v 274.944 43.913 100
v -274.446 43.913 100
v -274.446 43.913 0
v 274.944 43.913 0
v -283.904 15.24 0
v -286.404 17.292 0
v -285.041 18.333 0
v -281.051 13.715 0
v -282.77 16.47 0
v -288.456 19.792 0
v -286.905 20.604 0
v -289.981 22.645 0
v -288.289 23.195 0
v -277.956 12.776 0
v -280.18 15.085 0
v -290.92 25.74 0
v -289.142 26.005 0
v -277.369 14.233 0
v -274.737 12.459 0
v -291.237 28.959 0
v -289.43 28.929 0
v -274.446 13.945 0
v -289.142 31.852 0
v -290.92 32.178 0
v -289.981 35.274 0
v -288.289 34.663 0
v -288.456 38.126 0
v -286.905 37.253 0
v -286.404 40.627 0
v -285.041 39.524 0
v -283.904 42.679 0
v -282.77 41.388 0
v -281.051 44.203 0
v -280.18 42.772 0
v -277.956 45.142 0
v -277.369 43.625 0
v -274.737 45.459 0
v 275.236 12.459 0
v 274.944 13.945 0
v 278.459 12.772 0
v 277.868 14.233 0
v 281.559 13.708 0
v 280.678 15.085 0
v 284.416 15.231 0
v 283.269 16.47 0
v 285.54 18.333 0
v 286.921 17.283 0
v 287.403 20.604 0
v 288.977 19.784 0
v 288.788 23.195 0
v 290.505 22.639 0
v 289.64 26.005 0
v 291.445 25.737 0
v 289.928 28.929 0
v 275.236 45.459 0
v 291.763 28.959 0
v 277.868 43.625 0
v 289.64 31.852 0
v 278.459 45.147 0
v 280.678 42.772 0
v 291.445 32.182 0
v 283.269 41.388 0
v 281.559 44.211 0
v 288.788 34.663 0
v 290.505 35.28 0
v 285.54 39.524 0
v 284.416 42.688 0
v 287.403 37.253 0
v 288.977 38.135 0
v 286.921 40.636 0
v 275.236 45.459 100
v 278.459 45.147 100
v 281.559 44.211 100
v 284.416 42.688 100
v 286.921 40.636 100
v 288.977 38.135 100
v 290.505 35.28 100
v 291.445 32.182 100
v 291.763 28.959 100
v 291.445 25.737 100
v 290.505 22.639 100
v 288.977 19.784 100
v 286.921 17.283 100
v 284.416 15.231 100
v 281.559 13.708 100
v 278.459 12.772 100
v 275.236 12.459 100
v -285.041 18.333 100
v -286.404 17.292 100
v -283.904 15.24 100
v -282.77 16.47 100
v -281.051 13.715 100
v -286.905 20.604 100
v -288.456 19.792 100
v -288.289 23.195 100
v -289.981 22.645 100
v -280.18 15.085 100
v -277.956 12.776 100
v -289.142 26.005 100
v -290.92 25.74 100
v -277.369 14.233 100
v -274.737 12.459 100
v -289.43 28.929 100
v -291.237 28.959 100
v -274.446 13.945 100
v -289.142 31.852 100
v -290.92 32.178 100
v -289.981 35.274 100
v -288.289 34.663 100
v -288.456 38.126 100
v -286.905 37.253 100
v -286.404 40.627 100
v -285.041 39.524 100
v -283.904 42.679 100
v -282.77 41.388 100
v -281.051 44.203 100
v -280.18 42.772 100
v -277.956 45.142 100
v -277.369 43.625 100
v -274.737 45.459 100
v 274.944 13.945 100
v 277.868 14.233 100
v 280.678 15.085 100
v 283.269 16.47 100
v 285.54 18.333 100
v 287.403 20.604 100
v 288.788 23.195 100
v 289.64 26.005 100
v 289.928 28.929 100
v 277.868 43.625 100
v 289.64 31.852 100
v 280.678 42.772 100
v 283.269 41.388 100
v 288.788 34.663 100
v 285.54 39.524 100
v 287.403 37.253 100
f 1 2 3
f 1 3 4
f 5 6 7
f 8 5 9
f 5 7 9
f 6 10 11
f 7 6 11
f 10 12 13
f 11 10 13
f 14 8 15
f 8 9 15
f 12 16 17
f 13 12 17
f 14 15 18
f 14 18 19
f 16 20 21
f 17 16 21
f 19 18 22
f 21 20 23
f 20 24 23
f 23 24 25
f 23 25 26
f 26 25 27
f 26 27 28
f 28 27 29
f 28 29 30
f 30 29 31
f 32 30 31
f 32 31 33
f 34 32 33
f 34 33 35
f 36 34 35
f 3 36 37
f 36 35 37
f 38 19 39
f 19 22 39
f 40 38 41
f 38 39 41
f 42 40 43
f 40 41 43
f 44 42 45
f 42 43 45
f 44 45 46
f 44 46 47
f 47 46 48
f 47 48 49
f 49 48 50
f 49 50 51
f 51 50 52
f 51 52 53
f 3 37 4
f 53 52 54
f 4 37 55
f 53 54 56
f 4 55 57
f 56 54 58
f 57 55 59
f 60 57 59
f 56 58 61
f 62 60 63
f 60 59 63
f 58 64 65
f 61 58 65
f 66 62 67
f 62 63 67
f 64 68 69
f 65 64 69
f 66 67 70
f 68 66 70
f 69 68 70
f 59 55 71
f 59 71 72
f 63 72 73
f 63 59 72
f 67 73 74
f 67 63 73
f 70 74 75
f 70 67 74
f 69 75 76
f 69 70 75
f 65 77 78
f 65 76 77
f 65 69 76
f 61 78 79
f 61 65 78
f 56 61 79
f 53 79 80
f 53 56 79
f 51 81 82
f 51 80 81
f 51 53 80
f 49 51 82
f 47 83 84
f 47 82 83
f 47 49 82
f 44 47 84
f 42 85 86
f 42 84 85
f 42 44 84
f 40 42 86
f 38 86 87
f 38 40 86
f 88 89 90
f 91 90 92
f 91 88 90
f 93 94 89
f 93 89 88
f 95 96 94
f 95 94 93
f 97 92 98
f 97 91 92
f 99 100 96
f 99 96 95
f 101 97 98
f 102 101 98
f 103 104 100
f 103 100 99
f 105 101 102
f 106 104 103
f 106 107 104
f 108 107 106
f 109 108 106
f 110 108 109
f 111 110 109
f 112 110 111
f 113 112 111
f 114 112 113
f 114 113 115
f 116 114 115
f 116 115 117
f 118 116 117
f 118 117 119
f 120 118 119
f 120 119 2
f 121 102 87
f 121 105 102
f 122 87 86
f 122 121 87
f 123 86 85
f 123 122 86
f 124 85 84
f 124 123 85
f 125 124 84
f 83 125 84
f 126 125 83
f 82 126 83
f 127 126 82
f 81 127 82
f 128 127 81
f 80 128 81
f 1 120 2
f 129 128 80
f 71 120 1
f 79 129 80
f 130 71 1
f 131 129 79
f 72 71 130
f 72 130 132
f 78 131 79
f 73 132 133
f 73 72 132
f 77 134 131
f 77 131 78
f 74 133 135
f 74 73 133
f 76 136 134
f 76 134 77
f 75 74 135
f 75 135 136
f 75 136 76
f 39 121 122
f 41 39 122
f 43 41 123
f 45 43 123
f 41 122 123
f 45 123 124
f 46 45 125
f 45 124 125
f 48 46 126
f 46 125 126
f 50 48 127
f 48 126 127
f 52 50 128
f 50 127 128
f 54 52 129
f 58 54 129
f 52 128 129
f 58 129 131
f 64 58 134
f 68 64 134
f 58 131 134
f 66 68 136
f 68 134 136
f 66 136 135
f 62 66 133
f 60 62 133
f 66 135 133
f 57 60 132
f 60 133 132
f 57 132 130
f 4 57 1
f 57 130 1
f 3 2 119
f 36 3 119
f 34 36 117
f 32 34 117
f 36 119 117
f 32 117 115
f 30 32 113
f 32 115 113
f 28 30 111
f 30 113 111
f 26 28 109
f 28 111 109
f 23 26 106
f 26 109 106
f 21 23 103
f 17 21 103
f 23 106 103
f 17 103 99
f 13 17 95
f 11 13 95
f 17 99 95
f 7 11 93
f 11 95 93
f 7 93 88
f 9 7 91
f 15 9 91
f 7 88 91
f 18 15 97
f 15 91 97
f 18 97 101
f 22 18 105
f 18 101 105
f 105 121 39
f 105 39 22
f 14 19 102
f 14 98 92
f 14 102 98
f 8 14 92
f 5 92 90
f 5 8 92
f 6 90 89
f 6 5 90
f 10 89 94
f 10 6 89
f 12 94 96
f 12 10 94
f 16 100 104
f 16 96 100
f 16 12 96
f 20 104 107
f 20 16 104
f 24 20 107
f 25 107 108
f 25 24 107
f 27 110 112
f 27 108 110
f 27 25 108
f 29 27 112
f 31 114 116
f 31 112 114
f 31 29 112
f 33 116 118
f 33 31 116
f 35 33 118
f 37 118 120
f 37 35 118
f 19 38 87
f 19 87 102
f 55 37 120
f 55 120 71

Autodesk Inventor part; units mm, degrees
ref_plane "YZ Plane" through (0, 0, 0) normal (1, 0, 0) x (0, 1, 0)
ref_plane "XZ Plane" through (0, 0, 0) normal (0, 1, 0) x (-1, 0, 0)
ref_plane "XY Plane" through (0, 0, 0) normal (0, 0, 1) x (1, 0, 0)
sketch "Boceto1" plane through (0, 0, 0) normal (0, 0, 1) x (1, 0, 0)
  arc A0 (275.236, 12.4594) -> (275.236, 45.4594) centre (275.2631, 28.9594) ccw
  line L0 (275.236, 12.4594) -> (-274.7368, 12.4594)
  arc A1 (-274.7368, 45.4594) -> (-274.7368, 12.4594) centre (-274.7368, 28.9594) ccw
  line L1 (-274.7368, 45.4594) -> (275.236, 45.4594)
  point P0 (0, 0)
  point P1 (0, 43.9853)
  point P2 (0, 13.9594)
  point P3 (290.2632, 28.9594)
  point P4 (-289.7368, 28.9594)
  dimension "d5" = 580
extrude "Extrusión1" add sketch "Boceto1" along normal blind 100
sketch "Boceto2" plane through (0, 0, 100) normal (0, 0, 1) x (1, 0, 0)
  line L0 (-274.4457, 43.9128) -> (274.9443, 43.9128)
  line L1 (275.236, 45.4594) -> (-274.7368, 45.4594) projected
  line L2 (274.9443, 13.9446) -> (-274.4457, 13.9446)
  line L3 (-274.7368, 12.4594) -> (275.236, 12.4594) projected
  arc A0 (-274.4457, 43.9128) -> (-274.4457, 13.9446) centre (-274.4457, 28.9287) ccw
  arc A1 (274.9443, 13.9446) -> (274.9443, 43.9128) centre (274.9443, 28.9287) ccw
  arc A2 (-274.7368, 45.4594) -> (-274.7368, 12.4594) centre (-274.7368, 28.9594) ccw projected
  point P0 (0, 0)
  dimension "d18" = 549.39
extrude "Extrusión2" cut sketch "Boceto2" against normal blind 100
properties part number "Banda" material "Caucho, Silicona"
